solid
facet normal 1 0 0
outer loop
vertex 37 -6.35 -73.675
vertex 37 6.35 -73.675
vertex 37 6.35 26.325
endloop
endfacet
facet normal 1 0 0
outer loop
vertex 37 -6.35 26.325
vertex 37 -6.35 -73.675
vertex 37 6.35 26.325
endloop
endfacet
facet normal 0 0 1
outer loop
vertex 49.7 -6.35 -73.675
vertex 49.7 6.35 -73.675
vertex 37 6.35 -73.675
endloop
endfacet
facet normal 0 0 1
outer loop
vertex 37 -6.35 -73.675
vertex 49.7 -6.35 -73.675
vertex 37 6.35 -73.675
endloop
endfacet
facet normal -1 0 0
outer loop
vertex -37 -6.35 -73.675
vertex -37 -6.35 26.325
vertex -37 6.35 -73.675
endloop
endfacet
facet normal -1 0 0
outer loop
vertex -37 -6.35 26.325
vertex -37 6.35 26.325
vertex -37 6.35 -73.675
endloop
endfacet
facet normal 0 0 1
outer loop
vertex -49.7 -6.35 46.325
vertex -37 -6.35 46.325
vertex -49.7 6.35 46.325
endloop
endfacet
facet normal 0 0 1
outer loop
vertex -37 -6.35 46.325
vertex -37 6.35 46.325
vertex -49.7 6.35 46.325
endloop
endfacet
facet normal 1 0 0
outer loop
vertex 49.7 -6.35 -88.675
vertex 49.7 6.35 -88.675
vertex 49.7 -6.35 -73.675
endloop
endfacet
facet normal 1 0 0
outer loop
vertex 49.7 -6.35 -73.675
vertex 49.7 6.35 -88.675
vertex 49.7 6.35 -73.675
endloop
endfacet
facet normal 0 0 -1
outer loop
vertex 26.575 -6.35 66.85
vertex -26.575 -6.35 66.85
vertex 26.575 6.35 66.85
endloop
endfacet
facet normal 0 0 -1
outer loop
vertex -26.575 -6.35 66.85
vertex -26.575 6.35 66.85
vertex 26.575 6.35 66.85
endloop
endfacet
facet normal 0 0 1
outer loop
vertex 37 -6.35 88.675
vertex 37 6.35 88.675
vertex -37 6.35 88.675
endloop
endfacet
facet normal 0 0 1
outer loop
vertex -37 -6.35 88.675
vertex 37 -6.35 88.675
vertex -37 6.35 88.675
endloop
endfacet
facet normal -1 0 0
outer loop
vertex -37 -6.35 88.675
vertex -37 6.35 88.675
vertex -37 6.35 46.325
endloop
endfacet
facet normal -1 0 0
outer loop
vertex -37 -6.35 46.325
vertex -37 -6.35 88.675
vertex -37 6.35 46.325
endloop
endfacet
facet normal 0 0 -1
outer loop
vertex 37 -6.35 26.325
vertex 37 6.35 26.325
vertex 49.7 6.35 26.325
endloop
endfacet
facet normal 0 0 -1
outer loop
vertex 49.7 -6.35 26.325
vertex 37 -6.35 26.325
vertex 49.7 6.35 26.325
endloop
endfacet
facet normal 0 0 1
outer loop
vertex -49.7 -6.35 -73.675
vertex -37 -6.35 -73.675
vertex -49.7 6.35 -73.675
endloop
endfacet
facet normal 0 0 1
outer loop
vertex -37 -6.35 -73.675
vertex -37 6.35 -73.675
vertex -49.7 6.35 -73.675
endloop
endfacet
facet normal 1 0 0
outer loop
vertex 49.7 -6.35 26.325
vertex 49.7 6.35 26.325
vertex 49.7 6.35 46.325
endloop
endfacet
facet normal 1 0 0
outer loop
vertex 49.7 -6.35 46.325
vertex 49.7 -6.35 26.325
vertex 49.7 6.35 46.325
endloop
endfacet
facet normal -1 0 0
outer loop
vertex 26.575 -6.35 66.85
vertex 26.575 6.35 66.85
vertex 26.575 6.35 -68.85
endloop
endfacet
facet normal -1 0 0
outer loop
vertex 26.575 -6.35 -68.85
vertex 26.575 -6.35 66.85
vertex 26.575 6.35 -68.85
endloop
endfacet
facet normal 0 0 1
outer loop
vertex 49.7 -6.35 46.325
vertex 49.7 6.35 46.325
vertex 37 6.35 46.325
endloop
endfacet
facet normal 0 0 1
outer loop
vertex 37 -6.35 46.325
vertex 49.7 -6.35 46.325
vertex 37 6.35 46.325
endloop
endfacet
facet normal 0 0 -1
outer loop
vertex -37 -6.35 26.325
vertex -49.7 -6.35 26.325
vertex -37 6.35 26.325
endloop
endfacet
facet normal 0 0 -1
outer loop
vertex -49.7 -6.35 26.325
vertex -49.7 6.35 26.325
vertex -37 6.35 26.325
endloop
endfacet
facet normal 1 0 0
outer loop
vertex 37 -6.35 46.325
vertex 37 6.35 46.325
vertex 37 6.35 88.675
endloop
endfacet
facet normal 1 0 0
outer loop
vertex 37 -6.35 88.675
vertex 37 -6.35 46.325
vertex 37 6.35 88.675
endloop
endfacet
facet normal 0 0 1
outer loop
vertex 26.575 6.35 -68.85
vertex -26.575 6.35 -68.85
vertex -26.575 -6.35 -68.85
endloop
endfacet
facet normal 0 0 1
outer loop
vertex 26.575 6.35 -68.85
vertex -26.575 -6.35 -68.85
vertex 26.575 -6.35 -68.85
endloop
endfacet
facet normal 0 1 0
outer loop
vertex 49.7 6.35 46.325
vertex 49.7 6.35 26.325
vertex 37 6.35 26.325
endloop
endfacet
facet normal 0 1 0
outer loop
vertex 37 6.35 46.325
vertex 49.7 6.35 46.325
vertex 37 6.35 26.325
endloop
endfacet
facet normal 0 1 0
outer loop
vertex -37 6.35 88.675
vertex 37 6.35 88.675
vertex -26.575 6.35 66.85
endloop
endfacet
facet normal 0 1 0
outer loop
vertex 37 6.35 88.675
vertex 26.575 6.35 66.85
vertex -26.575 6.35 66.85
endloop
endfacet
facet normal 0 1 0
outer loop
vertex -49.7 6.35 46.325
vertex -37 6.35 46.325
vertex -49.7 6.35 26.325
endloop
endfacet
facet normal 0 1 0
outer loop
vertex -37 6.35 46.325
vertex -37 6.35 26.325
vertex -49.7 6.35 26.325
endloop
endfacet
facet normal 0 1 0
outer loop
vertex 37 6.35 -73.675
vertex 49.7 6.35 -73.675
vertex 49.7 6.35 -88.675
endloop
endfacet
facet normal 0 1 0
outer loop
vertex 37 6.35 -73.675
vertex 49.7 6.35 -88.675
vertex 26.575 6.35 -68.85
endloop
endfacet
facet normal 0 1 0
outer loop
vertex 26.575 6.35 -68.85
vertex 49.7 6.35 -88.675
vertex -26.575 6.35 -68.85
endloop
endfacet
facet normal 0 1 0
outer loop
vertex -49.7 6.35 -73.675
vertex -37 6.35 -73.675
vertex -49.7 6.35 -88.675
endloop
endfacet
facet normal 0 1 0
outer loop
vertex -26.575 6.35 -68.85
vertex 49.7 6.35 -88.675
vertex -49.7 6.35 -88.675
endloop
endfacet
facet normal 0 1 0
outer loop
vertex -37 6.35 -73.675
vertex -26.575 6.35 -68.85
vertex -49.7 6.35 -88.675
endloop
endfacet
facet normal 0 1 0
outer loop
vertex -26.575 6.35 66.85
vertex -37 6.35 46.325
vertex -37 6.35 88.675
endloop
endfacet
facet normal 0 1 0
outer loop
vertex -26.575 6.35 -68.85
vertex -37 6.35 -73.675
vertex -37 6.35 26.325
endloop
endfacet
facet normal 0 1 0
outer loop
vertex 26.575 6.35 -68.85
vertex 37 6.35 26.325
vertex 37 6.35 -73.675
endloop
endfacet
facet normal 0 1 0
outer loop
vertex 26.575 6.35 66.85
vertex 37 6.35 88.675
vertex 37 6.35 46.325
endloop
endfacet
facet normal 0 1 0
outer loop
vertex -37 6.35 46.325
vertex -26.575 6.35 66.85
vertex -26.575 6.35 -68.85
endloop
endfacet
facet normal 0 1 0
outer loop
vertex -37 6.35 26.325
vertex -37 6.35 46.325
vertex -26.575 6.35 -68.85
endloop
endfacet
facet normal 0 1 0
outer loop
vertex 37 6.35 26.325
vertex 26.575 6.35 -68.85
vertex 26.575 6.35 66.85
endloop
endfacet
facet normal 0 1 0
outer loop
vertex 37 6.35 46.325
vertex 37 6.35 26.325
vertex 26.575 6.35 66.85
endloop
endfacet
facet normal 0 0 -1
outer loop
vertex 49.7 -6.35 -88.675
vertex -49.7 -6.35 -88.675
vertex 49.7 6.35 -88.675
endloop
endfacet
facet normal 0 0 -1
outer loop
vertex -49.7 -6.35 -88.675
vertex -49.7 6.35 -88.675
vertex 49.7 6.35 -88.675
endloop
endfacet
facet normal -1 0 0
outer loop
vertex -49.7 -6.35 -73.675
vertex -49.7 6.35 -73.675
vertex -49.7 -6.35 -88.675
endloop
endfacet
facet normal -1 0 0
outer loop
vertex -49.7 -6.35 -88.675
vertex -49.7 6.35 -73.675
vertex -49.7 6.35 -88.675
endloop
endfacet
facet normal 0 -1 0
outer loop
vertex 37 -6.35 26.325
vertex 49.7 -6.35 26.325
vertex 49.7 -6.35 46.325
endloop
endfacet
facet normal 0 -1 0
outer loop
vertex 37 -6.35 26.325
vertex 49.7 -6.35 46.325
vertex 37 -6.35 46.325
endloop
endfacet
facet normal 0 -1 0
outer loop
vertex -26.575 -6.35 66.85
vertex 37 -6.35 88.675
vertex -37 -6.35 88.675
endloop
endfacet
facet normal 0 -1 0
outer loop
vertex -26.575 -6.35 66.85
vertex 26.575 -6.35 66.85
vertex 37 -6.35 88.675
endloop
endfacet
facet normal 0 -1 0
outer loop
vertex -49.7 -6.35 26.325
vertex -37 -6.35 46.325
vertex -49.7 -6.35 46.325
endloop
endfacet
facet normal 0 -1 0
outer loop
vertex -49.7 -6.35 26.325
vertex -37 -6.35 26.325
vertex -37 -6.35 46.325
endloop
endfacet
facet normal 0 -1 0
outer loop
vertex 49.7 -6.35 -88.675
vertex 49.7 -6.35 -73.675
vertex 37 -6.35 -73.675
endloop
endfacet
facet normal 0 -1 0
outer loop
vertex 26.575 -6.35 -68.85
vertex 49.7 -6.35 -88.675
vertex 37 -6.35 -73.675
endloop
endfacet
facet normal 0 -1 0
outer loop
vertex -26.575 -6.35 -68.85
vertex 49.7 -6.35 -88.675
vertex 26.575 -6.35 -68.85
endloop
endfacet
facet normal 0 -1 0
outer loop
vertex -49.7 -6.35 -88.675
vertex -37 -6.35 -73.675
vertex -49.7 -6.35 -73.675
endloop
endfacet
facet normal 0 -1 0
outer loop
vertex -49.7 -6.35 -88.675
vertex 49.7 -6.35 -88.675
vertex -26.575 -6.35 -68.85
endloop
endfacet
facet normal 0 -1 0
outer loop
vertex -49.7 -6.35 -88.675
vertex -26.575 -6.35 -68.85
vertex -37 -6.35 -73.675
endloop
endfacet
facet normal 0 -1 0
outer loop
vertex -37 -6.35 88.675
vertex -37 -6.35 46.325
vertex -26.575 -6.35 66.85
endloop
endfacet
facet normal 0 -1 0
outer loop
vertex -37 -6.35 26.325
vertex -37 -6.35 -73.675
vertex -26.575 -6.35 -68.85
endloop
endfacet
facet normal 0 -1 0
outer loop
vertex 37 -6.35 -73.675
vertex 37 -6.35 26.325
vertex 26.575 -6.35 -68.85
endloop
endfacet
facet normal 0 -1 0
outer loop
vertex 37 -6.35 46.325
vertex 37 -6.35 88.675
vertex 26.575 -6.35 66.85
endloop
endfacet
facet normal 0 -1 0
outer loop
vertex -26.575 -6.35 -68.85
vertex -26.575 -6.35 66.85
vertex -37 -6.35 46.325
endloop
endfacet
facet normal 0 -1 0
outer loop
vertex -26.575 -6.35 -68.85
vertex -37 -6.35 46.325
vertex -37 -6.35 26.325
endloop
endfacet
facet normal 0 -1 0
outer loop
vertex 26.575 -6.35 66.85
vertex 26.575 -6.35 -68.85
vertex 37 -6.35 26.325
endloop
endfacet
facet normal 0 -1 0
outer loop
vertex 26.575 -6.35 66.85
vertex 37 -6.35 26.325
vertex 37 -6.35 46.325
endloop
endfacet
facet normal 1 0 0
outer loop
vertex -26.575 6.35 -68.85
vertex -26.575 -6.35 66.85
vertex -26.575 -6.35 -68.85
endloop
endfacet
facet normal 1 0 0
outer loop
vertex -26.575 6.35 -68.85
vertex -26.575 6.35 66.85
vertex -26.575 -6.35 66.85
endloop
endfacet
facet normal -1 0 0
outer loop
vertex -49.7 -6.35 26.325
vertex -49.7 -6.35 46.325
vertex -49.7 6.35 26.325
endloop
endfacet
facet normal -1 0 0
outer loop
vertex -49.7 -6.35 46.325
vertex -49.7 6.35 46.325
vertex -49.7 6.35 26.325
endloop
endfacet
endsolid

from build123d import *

# Parameters (mm, degrees)
SKETCH1_W           = 53.15
SKETCH1_H           = 135.7
BOSS_EXTRUDE1_DEPTH = 6.35


with BuildPart() as part:
    # Sketch1 → Boss-Extrude1 (new, symmetric)
    with BuildSketch(Plane(origin=(0, 0, 0), x_dir=(1, 0, 0), z_dir=(0, 1, 0))):
        Polygon((-37, -88.675), (-37, -46.325), (-49.7, -46.325), (-49.7, -26.325), (-37, -26.325), (-37, 73.675), (-49.7, 73.675), (-49.7, 88.675), (49.7, 88.675), (49.7, 73.675), (37, 73.675), (37, -26.325), (49.7, -26.325), (49.7, -46.325), (37, -46.325), (37, -88.675), align=None)
        with Locations((0, 1)):
            Rectangle(SKETCH1_W, SKETCH1_H, mode=Mode.SUBTRACT)
    extrude(amount=BOSS_EXTRUDE1_DEPTH, both=True)


solid = part.part
